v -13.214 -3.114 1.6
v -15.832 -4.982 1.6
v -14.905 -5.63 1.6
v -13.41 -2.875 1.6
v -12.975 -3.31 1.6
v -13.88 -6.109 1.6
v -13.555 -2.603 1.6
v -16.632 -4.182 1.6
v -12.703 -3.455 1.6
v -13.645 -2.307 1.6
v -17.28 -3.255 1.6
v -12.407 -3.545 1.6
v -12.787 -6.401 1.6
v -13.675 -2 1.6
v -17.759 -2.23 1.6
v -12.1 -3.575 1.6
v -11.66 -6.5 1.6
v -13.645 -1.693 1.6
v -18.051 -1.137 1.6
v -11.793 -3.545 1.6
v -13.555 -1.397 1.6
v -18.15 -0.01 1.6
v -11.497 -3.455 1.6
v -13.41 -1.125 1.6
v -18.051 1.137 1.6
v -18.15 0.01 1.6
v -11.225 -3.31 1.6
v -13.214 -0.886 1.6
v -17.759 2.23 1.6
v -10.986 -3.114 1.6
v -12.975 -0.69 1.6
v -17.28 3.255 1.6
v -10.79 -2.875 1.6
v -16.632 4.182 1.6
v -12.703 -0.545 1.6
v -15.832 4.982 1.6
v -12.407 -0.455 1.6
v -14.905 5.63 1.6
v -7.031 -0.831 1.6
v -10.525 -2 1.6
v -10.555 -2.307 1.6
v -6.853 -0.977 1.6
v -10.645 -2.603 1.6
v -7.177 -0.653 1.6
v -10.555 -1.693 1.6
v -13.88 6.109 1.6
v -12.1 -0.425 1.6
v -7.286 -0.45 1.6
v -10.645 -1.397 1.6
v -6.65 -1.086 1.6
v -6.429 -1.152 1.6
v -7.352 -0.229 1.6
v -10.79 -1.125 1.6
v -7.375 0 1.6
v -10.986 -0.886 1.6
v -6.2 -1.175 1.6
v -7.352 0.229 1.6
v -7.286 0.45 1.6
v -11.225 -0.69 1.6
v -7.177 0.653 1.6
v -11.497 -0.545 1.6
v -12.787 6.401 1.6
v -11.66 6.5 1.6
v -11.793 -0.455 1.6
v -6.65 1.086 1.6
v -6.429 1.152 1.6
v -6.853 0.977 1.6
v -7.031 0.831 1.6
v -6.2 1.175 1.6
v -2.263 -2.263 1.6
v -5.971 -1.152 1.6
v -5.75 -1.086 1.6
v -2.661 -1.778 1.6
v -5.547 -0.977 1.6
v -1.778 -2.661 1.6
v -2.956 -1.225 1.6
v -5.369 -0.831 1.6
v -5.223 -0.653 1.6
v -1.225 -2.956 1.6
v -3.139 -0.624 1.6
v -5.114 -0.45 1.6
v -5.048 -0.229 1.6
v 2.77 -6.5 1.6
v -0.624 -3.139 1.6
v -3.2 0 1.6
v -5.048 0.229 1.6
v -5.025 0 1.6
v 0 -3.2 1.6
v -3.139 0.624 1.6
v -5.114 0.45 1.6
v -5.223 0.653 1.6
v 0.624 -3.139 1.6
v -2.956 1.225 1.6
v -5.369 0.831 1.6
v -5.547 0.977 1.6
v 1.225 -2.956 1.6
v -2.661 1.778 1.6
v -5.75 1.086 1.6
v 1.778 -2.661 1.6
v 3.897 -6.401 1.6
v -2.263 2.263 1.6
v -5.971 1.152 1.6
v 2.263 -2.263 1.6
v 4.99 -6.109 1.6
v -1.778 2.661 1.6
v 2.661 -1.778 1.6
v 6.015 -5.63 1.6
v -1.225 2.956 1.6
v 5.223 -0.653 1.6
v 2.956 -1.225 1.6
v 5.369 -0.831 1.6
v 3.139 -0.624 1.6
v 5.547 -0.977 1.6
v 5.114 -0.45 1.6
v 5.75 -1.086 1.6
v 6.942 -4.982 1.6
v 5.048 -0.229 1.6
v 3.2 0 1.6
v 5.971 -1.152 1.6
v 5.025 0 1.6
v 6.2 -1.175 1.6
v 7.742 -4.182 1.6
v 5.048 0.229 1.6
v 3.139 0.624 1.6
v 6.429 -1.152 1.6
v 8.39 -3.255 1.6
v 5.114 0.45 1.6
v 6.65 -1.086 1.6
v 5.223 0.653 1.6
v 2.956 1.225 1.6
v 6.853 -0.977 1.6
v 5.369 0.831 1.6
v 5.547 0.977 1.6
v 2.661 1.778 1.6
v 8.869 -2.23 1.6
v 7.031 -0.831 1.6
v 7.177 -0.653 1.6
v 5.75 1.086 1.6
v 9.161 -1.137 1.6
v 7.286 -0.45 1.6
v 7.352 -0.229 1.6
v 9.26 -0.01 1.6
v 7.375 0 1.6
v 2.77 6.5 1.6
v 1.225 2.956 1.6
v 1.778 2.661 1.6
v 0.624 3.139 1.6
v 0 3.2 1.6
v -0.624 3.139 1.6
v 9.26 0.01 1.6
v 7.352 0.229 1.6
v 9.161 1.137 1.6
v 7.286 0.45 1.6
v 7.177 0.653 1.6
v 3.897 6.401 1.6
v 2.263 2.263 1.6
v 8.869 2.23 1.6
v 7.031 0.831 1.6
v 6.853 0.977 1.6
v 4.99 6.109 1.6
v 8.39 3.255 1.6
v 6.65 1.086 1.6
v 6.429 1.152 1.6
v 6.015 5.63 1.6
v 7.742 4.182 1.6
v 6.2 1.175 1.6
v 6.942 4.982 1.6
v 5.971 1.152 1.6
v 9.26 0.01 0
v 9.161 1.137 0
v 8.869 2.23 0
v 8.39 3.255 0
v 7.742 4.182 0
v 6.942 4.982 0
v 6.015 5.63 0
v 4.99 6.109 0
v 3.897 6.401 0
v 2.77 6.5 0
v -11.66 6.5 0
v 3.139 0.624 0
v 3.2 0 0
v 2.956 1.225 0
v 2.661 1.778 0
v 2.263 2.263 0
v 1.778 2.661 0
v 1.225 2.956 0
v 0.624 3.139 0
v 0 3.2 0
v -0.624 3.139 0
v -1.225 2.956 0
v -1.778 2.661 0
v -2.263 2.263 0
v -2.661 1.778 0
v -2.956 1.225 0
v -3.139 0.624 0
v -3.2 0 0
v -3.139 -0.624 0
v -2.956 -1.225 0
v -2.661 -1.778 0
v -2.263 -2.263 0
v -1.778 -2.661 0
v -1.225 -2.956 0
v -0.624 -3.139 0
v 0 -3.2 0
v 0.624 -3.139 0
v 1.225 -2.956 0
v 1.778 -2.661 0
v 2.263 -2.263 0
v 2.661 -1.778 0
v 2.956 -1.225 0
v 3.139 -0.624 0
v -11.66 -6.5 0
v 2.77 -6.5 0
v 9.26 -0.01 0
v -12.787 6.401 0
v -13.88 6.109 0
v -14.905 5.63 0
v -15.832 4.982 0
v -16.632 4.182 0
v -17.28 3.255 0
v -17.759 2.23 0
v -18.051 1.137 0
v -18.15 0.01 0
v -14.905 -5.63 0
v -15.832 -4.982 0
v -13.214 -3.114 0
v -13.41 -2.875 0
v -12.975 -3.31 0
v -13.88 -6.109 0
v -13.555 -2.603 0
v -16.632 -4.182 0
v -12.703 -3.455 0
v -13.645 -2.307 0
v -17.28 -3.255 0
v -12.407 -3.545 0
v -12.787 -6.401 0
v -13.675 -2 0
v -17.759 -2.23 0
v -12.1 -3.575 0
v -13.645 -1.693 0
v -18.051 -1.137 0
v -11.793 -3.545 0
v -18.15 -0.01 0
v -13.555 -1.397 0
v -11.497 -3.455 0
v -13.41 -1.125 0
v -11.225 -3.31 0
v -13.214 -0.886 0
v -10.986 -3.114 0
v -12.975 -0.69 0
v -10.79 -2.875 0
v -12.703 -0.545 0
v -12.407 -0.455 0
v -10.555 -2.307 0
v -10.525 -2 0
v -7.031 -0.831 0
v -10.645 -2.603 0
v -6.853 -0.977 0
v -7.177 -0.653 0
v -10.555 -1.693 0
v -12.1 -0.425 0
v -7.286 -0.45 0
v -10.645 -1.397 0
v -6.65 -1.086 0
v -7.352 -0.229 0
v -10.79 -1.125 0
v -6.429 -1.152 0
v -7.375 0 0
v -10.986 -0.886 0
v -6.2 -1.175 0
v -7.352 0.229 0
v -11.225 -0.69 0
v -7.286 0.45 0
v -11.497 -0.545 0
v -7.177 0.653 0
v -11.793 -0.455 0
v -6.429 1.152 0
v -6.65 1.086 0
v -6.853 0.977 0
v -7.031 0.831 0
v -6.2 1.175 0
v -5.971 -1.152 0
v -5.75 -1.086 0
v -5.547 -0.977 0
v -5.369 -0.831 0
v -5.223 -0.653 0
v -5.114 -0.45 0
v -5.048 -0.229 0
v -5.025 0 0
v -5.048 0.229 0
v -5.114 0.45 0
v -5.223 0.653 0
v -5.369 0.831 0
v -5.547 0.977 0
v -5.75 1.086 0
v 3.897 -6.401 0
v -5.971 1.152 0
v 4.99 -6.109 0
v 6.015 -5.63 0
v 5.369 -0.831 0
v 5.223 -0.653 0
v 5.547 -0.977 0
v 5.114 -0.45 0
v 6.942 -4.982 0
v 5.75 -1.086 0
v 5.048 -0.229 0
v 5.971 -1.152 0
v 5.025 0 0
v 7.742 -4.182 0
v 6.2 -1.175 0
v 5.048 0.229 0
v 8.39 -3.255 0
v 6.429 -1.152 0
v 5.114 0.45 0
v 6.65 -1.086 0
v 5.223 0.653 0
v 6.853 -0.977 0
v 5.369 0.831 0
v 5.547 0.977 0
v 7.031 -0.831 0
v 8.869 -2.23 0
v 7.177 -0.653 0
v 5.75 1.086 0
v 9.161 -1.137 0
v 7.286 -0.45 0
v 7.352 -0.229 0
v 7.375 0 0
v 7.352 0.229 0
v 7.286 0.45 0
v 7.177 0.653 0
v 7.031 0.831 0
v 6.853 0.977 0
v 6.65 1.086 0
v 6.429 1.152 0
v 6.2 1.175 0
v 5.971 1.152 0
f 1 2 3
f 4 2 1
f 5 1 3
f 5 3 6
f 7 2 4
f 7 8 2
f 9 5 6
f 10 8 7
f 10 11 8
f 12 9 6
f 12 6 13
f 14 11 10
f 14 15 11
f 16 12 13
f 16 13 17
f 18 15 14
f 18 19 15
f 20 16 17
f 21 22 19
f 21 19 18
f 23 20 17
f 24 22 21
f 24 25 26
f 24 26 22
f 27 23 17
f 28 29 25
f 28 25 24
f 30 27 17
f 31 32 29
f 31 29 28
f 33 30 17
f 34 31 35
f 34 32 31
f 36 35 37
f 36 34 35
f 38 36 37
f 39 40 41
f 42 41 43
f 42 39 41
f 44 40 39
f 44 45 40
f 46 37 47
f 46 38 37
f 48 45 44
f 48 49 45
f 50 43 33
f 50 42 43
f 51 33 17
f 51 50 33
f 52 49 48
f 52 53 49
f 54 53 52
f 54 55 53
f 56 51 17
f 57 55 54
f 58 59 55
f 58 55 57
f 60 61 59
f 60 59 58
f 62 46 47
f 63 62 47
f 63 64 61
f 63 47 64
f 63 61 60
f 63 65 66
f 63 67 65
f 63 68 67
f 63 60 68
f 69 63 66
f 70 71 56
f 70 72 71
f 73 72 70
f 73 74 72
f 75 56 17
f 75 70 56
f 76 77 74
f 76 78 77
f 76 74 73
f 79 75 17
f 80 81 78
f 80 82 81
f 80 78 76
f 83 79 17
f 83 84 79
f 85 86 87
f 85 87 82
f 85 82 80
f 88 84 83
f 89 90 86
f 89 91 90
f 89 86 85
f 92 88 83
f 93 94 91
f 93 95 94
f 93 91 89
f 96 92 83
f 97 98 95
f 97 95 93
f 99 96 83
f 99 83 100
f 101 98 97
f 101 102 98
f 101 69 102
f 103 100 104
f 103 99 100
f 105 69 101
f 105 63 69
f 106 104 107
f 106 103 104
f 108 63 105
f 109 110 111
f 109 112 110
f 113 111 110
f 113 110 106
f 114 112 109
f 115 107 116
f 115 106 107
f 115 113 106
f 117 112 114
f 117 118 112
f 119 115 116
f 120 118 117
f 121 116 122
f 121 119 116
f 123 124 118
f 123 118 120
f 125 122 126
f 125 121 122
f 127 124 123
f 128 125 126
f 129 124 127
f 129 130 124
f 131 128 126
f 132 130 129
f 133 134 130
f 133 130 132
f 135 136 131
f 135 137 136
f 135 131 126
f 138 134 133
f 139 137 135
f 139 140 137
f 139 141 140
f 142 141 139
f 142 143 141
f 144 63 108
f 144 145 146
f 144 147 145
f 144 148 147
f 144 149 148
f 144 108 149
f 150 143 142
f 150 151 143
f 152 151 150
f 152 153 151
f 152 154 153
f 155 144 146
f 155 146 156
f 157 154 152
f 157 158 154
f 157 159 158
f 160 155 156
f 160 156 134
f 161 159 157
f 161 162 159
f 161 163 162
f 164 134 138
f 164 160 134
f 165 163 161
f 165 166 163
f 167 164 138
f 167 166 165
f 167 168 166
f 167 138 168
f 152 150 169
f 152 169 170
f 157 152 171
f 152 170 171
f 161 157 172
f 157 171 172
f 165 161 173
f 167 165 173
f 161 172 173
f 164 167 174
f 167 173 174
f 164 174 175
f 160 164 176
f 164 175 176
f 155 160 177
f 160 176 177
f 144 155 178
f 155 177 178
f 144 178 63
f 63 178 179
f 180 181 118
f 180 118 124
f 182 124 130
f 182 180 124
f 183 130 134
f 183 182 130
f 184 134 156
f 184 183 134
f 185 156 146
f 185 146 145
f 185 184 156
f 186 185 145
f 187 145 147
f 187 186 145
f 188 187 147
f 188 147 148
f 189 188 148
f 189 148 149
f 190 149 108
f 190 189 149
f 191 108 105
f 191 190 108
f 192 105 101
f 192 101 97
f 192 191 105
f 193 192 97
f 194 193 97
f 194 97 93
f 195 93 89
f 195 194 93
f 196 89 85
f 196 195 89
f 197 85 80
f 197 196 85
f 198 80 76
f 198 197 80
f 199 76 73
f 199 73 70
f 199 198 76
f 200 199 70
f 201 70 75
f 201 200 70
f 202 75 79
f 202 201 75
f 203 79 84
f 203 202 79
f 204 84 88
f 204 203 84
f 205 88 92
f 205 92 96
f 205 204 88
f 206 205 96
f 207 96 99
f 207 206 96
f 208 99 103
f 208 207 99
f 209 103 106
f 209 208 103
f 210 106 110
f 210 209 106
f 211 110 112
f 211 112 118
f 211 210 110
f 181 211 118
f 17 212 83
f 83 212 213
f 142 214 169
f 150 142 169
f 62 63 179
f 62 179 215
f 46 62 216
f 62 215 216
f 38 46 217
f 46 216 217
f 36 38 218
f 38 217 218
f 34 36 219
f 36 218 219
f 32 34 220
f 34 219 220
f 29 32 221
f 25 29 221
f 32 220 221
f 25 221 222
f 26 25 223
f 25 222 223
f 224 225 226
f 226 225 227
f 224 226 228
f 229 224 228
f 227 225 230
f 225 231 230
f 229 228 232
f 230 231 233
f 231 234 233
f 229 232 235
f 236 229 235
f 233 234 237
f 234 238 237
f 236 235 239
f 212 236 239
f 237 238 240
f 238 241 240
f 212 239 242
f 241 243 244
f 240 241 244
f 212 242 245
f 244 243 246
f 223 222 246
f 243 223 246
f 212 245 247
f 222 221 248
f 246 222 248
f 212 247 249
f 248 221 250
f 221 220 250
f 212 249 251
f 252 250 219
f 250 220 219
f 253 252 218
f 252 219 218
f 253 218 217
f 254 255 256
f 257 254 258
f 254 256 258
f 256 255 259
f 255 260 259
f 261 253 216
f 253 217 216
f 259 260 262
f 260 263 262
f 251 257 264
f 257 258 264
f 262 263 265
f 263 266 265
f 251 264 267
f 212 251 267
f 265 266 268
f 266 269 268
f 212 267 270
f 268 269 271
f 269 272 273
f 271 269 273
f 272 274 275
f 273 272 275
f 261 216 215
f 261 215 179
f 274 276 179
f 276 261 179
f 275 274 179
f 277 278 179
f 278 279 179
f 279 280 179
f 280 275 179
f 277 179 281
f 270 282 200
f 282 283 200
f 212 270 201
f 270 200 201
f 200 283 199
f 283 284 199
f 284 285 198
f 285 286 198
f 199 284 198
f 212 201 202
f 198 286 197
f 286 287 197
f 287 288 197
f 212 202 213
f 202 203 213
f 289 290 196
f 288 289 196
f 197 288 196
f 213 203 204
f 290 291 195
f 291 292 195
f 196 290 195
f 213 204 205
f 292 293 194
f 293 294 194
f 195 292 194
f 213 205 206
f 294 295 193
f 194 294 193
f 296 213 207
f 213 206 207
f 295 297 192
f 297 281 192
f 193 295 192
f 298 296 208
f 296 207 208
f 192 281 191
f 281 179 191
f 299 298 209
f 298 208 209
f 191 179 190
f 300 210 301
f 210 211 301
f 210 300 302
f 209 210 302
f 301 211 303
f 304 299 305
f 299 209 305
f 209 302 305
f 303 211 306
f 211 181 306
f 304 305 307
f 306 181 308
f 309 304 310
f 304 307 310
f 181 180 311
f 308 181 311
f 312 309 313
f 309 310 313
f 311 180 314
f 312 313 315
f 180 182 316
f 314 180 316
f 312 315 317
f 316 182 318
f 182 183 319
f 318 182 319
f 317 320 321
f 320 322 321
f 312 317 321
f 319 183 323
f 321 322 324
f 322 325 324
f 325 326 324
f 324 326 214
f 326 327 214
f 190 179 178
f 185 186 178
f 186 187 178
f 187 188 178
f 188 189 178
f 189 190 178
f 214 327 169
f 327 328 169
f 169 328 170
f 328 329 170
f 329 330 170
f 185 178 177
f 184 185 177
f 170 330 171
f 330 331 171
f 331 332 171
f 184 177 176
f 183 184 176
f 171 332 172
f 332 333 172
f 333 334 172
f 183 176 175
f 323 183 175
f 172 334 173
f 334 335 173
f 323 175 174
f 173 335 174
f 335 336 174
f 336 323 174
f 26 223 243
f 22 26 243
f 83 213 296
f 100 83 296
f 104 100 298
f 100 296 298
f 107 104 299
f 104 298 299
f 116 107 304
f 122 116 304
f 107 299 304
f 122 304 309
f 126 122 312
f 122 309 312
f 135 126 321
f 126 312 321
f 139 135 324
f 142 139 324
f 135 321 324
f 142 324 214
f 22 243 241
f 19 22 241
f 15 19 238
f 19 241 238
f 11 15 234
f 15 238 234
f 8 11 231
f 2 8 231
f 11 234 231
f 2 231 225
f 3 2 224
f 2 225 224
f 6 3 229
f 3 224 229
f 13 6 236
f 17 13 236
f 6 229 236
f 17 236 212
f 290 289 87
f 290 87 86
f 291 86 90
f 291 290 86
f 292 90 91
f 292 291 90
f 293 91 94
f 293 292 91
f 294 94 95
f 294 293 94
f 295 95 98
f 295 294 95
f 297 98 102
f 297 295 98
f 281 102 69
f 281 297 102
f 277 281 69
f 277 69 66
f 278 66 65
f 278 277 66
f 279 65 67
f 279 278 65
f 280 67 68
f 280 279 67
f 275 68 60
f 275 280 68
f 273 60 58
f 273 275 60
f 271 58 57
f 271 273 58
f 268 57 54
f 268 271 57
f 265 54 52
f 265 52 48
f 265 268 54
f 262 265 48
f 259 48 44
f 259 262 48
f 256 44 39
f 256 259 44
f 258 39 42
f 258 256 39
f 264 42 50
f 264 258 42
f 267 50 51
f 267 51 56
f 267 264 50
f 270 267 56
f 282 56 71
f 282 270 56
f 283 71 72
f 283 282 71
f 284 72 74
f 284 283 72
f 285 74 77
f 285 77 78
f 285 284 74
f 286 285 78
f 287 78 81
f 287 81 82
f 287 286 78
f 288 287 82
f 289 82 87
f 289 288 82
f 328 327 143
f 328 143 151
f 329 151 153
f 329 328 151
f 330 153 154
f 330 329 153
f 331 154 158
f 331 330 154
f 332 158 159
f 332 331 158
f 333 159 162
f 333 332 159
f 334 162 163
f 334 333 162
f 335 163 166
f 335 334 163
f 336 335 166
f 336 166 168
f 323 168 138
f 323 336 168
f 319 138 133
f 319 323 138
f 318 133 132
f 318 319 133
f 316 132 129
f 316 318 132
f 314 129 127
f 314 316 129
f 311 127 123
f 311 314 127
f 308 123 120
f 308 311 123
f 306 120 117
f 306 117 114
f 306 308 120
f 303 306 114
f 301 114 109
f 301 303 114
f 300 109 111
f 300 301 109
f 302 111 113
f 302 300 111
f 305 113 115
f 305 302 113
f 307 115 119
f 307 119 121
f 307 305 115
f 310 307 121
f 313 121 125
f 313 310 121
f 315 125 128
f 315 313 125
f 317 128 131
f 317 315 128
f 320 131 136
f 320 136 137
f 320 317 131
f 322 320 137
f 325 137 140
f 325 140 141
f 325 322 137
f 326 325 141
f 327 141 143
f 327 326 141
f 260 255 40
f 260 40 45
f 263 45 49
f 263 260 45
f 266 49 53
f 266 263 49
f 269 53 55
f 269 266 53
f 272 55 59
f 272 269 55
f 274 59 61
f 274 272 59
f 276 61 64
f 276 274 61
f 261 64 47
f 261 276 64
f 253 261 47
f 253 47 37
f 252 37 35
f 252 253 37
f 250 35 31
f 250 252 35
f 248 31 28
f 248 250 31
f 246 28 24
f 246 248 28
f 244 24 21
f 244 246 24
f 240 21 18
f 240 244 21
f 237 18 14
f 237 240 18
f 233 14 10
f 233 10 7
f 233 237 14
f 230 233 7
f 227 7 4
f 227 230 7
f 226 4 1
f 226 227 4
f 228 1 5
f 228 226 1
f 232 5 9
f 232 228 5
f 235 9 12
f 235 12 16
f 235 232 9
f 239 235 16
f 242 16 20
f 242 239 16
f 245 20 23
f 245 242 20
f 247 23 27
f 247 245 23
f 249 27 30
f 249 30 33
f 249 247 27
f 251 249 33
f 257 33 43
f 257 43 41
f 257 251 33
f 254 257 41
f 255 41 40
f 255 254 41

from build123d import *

# Parameters (mm, degrees)
MODEL_R                 = 0.0003
MODEL_R_2               = 0.0002
MODEL_R_3               = 0.00025
MODEL_R_4               = 1.175
MODEL_R_5               = 3.2
MODEL_R_6               = 1.575
SALIENTE_EXTRUIR1_DEPTH = 1.6


with BuildPart() as part:
    # Model → Saliente-Extruir1 (new body)
    # profile 1 of 9: a face of its own
    with BuildSketch(Plane.XY):
        with Locations((-11.66, -6.5)):
            Circle(MODEL_R)
    # profile 2 of 9: a face of its own
    with BuildSketch(Plane.XY):
        with Locations((2.77, -6.5)):
            Circle(MODEL_R)
    # profile 3 of 9: a face of its own
    with BuildSketch(Plane.XY):
        with Locations((9.26, -0.01)):
            Circle(MODEL_R_2)
    # profile 4 of 9: a face of its own
    with BuildSketch(Plane.XY):
        with Locations((9.26, 0.01)):
            Circle(MODEL_R_2)
    # profile 5 of 9: a face of its own
    with BuildSketch(Plane.XY):
        with Locations((2.77, 6.5)):
            Circle(MODEL_R)
    # profile 6 of 9: a face of its own
    with BuildSketch(Plane.XY):
        with Locations((-11.66, 6.5)):
            Circle(MODEL_R)
    # profile 7 of 9: a face of its own
    with BuildSketch(Plane.XY):
        with Locations((-18.15005, 0.01)):
            Circle(MODEL_R_3)
    # profile 8 of 9: a face of its own
    with BuildSketch(Plane.XY):
        with Locations((-18.15005, -0.01)):
            Circle(MODEL_R_3)
    # profile 9 of 9: a face of its own
    with BuildSketch(Plane.XY):
        with BuildLine():
            Line((-11.66, -6.5), (2.77, -6.5))
            ThreePointArc((2.77, -6.5), (7.359079, -4.599079), (9.26, -0.01))
            Line((9.26, -0.01), (9.26, 0.01))
            ThreePointArc((9.26, 0.01), (7.359079, 4.599079), (2.77, 6.5))
            Line((2.77, 6.5), (-11.66, 6.5))
            ThreePointArc((-11.66, 6.5), (-16.249079, 4.599079), (-18.15, 0.01))
            Line((-18.15, 0.01), (-18.15, -0.01))
            ThreePointArc((-18.15, -0.01), (-16.249079, -4.599079), (-11.66, -6.5))
        make_face()
        with Locations((6.2, 0)):
            Circle(MODEL_R_4, mode=Mode.SUBTRACT)
        with Locations((-6.2, 0)):
            Circle(MODEL_R_4, mode=Mode.SUBTRACT)
        Circle(MODEL_R_5, mode=Mode.SUBTRACT)
        with Locations((-12.1, -2)):
            Circle(MODEL_R_6, mode=Mode.SUBTRACT)
    extrude(amount=SALIENTE_EXTRUIR1_DEPTH)


solid = part.part
